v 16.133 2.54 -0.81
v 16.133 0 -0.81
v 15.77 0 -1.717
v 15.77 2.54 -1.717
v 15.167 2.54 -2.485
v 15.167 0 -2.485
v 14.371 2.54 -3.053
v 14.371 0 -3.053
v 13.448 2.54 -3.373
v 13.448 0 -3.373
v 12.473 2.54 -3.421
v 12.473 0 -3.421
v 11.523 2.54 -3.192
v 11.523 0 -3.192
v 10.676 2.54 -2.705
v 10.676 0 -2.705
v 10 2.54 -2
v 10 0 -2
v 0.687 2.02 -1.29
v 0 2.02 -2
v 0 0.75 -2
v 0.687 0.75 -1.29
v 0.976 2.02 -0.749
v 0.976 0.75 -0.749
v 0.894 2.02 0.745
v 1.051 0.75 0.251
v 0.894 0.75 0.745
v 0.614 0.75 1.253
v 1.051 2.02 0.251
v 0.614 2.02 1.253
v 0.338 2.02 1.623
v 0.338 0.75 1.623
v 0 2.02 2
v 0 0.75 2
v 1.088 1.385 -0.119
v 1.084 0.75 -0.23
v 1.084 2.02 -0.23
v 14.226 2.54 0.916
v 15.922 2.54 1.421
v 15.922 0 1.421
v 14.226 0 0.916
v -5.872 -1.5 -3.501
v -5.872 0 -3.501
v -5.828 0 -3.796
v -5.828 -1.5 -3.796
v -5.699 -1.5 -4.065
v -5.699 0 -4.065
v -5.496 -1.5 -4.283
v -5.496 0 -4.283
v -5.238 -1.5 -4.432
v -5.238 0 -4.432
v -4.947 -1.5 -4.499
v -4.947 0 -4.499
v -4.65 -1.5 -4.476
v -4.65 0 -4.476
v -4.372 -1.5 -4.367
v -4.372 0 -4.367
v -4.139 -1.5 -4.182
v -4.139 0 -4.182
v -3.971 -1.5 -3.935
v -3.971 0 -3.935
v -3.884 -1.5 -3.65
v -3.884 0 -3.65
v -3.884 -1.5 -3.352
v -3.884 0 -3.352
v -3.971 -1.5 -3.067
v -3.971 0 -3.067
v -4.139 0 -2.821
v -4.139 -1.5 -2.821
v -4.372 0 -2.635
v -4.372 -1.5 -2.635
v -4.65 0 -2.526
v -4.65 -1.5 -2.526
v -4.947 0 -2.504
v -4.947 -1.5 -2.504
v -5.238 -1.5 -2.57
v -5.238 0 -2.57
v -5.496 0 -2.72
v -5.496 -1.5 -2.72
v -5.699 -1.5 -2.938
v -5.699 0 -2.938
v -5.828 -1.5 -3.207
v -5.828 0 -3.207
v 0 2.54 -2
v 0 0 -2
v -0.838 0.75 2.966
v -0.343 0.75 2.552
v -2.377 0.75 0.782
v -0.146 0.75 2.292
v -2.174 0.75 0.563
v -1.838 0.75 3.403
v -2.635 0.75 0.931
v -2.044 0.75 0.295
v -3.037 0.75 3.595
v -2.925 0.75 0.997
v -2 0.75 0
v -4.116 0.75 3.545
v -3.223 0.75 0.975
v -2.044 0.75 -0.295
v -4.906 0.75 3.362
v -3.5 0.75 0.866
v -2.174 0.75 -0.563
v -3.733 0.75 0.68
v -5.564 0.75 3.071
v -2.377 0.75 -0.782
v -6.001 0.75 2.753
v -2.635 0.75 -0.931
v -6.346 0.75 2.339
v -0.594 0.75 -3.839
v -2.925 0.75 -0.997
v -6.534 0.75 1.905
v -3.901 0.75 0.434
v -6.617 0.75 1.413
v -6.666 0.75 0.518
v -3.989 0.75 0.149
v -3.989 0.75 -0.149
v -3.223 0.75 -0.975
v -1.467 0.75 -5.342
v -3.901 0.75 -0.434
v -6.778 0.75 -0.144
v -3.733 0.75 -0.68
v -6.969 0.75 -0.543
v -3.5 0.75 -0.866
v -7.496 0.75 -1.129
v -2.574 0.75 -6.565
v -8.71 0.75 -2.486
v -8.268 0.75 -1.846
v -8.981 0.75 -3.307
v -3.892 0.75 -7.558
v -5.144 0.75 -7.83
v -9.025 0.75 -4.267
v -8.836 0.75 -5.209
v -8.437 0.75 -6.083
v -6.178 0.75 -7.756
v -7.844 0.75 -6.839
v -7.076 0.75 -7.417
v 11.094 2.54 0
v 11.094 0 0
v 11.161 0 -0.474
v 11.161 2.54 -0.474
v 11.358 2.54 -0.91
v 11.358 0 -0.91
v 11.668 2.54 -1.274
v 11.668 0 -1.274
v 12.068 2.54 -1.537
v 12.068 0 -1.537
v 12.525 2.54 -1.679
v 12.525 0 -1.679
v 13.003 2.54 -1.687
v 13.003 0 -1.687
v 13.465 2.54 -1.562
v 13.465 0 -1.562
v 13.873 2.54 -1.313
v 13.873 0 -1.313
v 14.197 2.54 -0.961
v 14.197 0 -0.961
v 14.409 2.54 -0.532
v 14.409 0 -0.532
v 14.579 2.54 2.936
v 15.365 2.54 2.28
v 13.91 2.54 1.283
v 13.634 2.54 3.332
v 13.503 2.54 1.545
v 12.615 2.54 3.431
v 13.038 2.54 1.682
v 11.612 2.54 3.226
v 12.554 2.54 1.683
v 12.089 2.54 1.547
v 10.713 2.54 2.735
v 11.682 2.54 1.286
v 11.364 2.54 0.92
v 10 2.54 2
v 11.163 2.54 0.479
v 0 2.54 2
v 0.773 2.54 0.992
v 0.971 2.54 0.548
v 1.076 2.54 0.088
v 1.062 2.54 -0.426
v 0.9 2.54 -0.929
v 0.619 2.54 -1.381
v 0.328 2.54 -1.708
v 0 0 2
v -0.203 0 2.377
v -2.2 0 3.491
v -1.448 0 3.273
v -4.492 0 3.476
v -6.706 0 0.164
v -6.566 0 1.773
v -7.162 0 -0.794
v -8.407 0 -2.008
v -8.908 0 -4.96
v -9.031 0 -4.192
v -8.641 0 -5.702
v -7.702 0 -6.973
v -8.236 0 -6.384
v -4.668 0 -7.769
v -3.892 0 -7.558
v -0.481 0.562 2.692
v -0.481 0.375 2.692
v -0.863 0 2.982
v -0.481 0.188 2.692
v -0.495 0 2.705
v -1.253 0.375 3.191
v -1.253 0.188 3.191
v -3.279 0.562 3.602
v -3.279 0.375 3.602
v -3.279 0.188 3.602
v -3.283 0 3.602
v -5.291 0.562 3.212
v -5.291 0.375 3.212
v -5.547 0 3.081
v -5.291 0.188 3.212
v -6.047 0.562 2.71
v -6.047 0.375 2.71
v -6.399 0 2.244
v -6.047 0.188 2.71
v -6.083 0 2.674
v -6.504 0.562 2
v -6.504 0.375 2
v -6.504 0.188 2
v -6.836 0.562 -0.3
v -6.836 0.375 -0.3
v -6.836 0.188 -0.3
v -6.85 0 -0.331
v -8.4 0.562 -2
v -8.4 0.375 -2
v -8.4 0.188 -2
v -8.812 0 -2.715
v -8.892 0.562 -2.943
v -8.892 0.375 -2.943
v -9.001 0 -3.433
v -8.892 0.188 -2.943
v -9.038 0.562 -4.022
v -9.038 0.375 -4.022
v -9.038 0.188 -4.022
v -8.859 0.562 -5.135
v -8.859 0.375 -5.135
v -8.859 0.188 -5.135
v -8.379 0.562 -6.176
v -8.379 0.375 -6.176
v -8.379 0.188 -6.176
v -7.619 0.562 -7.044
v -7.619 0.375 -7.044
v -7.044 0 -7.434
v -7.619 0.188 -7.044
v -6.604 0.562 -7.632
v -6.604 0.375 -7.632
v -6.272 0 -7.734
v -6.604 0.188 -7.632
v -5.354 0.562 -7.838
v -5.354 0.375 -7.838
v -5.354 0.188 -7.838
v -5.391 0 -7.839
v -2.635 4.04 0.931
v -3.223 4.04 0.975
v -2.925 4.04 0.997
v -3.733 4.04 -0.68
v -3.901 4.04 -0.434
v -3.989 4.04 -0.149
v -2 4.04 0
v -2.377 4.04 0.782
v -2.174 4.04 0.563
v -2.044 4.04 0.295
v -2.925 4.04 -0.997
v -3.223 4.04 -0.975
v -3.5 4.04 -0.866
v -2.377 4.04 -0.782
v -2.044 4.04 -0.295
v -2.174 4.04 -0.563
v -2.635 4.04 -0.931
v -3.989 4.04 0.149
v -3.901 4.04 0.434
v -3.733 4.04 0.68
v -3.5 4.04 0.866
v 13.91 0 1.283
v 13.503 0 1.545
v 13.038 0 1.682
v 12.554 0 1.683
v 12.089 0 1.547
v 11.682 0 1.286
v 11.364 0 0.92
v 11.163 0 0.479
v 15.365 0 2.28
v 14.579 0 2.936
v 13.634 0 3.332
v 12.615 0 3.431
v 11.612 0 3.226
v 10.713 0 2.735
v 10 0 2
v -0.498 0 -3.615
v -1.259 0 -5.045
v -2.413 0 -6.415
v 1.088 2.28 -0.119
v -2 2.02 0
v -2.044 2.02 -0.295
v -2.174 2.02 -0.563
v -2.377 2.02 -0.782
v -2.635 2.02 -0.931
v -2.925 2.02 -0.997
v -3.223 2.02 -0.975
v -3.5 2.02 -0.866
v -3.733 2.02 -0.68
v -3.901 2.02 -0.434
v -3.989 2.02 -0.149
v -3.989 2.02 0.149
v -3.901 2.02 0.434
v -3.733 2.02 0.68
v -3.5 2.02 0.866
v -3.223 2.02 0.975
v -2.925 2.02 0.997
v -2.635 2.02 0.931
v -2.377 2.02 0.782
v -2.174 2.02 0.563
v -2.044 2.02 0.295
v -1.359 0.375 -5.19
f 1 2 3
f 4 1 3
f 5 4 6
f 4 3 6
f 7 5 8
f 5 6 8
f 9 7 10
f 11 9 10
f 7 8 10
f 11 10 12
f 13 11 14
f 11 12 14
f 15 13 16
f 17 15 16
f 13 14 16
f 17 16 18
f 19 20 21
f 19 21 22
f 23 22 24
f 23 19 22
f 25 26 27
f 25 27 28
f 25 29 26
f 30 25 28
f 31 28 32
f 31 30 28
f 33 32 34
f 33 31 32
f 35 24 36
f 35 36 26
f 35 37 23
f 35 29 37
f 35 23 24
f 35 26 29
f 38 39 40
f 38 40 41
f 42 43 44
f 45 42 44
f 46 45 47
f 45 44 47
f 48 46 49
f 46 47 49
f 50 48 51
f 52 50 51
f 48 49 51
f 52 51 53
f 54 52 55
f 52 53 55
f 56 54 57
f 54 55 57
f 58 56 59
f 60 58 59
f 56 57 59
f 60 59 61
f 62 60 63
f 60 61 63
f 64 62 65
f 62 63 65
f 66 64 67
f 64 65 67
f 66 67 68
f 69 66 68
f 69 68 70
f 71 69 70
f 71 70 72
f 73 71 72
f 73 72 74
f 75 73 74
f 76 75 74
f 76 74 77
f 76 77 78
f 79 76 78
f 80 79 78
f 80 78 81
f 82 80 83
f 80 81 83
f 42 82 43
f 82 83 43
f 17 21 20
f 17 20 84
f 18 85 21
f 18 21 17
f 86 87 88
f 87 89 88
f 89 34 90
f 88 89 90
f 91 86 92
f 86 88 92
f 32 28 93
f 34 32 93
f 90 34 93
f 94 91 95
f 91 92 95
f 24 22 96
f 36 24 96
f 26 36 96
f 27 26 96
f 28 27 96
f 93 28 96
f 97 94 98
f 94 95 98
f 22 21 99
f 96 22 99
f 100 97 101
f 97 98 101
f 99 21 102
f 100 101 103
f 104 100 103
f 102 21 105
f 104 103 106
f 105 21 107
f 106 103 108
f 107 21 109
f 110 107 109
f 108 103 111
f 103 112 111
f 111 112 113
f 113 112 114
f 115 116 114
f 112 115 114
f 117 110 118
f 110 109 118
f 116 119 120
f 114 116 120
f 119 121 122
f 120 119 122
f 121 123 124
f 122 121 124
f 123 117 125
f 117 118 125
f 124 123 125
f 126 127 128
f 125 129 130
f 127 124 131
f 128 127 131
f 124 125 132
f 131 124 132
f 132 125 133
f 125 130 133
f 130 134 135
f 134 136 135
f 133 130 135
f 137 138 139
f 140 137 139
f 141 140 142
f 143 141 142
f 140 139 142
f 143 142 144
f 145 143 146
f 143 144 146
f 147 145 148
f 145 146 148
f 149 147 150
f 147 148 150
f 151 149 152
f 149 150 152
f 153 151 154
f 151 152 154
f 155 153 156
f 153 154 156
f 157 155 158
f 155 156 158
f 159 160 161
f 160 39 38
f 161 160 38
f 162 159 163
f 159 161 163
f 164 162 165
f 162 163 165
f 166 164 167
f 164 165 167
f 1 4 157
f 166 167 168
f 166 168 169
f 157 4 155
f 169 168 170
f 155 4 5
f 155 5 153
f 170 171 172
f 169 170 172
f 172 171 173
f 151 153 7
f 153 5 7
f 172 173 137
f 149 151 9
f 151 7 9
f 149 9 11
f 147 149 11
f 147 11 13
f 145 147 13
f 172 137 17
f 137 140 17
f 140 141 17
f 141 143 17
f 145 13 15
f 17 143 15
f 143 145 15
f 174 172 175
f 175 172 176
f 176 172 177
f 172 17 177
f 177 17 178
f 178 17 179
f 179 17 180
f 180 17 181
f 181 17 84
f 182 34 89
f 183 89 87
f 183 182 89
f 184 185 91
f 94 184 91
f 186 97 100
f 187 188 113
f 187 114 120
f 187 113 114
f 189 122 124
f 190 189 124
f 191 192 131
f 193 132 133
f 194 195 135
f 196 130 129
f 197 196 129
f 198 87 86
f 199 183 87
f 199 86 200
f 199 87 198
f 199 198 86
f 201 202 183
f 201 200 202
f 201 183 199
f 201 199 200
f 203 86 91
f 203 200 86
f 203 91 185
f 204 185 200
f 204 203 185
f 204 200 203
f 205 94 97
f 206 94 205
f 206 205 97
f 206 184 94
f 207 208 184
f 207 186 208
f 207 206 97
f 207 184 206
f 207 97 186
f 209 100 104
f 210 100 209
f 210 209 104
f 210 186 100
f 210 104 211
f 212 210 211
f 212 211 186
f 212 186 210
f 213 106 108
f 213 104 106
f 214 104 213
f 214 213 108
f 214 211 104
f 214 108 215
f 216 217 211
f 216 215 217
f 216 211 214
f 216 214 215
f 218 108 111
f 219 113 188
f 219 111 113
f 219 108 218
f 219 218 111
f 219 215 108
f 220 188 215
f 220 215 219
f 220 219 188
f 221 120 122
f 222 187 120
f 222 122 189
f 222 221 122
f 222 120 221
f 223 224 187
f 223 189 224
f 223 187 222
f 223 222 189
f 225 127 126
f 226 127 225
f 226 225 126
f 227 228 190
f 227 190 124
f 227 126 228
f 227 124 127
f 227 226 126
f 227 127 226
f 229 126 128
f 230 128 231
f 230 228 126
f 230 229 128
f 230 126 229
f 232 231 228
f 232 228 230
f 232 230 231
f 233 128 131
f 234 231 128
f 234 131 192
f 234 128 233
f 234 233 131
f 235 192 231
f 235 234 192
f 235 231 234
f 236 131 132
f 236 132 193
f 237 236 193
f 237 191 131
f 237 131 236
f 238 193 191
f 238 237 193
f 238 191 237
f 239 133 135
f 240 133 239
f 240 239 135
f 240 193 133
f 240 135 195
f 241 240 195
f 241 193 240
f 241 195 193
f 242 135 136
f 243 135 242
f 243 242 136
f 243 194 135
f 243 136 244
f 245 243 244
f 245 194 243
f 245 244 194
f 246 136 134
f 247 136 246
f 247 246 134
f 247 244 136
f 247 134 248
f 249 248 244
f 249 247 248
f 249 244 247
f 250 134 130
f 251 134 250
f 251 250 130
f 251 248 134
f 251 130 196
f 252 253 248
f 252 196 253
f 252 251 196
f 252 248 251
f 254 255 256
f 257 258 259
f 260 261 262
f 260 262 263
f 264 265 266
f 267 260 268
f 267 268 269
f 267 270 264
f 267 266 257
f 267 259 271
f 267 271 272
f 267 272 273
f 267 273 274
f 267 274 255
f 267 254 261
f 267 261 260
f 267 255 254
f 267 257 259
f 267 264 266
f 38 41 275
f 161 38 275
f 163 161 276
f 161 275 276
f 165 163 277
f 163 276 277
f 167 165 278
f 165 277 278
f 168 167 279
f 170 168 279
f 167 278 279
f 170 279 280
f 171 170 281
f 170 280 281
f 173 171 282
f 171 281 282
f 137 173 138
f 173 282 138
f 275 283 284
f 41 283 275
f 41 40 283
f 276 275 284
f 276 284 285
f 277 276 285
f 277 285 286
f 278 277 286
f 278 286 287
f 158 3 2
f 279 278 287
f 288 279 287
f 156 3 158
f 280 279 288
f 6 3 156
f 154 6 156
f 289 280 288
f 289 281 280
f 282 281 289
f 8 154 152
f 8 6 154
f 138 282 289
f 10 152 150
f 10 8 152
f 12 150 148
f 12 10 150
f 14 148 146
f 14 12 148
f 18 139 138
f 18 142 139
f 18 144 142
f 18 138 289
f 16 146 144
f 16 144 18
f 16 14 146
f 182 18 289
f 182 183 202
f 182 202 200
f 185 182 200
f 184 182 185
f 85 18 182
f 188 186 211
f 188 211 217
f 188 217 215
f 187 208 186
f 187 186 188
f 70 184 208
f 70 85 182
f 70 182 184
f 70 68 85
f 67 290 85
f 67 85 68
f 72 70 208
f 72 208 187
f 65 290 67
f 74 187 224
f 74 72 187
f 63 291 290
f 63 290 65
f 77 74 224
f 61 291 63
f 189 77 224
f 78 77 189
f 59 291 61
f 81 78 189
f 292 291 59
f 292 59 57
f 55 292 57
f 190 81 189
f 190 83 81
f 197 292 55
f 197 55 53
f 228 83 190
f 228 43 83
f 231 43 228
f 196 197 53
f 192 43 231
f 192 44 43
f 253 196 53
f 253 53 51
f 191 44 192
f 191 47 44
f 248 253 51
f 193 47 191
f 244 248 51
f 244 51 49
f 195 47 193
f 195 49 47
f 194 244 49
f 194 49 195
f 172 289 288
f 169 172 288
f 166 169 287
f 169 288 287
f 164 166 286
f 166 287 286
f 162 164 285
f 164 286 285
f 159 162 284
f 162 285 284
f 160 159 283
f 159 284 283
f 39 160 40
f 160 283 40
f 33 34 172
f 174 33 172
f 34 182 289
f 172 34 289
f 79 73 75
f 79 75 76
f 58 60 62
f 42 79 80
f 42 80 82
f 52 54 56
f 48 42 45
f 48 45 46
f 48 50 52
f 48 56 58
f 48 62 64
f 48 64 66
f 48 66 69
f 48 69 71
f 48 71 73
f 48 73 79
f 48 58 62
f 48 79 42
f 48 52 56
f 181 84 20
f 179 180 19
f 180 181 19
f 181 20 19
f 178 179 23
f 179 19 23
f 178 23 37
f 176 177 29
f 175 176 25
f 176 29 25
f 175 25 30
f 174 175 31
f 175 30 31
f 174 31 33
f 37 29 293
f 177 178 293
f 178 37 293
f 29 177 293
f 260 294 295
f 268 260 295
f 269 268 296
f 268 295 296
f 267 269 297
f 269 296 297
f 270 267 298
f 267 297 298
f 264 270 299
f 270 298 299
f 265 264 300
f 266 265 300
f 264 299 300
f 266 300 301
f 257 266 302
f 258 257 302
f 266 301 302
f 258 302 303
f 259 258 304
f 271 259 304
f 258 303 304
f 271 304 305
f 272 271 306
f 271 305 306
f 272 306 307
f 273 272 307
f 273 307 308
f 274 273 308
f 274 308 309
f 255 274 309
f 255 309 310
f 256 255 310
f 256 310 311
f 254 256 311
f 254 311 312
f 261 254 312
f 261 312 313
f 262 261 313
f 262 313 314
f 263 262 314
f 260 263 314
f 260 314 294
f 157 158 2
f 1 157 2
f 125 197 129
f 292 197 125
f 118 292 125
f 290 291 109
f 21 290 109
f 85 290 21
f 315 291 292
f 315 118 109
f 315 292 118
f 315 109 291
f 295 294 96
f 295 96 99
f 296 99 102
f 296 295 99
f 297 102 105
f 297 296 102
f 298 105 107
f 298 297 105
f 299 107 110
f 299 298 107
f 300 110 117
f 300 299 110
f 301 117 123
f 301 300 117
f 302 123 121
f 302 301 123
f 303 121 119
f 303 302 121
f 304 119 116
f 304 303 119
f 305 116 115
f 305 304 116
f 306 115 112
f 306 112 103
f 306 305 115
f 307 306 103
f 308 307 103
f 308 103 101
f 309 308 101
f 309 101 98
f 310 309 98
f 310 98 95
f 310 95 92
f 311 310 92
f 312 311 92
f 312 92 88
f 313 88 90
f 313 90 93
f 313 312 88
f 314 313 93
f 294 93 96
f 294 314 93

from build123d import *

# Parameters (mm, degrees)
SKETCH1_W               = 10
SKETCH1_H               = 4
BOSS_EXTRUDE2_DEPTH     = 2.54
SKETCH3_R               = 1
BOSS_EXTRUDE3_DEPTH     = 1.5
SKETCH4_R               = 1
BOSS_EXTRUDE5_DEPTH     = 1.5
SKETCH6_R               = 1
CUT_EXTRUDE1_DEPTH      = 2.54
CUT_EXTRUDE1_DEPTH_BACK = 1.27


with BuildPart() as part:
    # Sketch1 → Boss-Extrude2 (new body)
    with BuildSketch(Plane(origin=(0, 0, 0), x_dir=(1, 0, 0), z_dir=(0, 1, 0))):
        with BuildLine():
            add(Edge.make_bspline(
                [(-3.892071286, 7.55845385), (-0.771451313, 5.601679727), (0, 2)],
                knots=[0, 0, 0, 1, 1, 1], degree=2))
            Line((0, 2), (0, -2))
            add(Edge.make_bspline(
                [(0, -2), (-0.807019421, -4.0986057), (-7.360800537, -4.196276699), (-6.343457725, 0.548340217), (-10.778232398, 2.929025773), (-8.051665625, 9.045483404), (-3.892071286, 7.55845385)],
                knots=[0, 0, 0, 0, 0.355860313, 0.470047608, 0.583542681, 1, 1, 1, 1], degree=3))
        make_face()
        with Locations((5, 0)):
            Rectangle(SKETCH1_W, SKETCH1_H)
        with BuildLine():
            Line((11.094, 0), (10, 0))
            Line((10, 0), (10, -2))
            ThreePointArc((10, -2), (13.128207579, -3.419757491), (15.922350304, -1.421217919))
            Line((15.922350304, -1.421217919), (14.22610231, -0.916014724))
            ThreePointArc((14.22610231, -0.916014724), (12.316807128, -1.631651606), (11.094, 0))
        make_face()
        with BuildLine():
            Line((10, 2), (10, 0))
            Line((10, 0), (11.094, 0))
            ThreePointArc((11.094, 0), (12.524636877, 1.678524205), (14.408639421, 0.531920615))
            Line((14.408639421, 0.531920615), (16.133188964, 0.810094479))
            ThreePointArc((16.133188964, 0.810094479), (13.448428406, 3.373152748), (10, 2))
        make_face()
    extrude(amount=BOSS_EXTRUDE2_DEPTH)

    # Sketch3 → Boss-Extrude3 (add)
    with BuildSketch(Plane(origin=(0, 2.54, 0), x_dir=(1, 0, 0), z_dir=(0, 1, 0))):
        with Locations((-3, 0)):
            Circle(SKETCH3_R)
    extrude(amount=BOSS_EXTRUDE3_DEPTH)

    # Sketch4 → Boss-Extrude5 (add)
    with BuildSketch(Plane(origin=(0, 0, 0), x_dir=(-1, 0, 0), z_dir=(0, -1, 0))):
        with Locations((4.872437244, 3.501336217)):
            Circle(SKETCH4_R)
    extrude(amount=BOSS_EXTRUDE5_DEPTH)

    # Sketch6 → Cut-Extrude1 (cut, two sides)
    with BuildSketch(Plane(origin=(0, 2.02, 0), x_dir=(1, 0, 0), z_dir=(0, 1, 0))) as cut_extrude1_sk:
        with BuildLine():
            Line((0, 8.859088838), (0, 2))
            add(Edge.make_bspline(
                [(0, 2), (2.175152806, 0.238184258), (0, -2)],
                knots=[0, 0, 0, 1, 1, 1], degree=2))
            Line((0, -2), (0, -4.672458071))
            Line((0, -4.672458071), (-11.092635024, -4.672458071))
            Line((-11.092635024, -4.672458071), (-11.092635024, 8.859088838))
            Line((-11.092635024, 8.859088838), (0, 8.859088838))
        make_face()
        with Locations((-3, 0)):
            Circle(SKETCH6_R, mode=Mode.SUBTRACT)
    extrude(amount=CUT_EXTRUDE1_DEPTH, mode=Mode.SUBTRACT)
    extrude(cut_extrude1_sk.sketch, amount=-CUT_EXTRUDE1_DEPTH_BACK, mode=Mode.SUBTRACT)


solid = part.part
